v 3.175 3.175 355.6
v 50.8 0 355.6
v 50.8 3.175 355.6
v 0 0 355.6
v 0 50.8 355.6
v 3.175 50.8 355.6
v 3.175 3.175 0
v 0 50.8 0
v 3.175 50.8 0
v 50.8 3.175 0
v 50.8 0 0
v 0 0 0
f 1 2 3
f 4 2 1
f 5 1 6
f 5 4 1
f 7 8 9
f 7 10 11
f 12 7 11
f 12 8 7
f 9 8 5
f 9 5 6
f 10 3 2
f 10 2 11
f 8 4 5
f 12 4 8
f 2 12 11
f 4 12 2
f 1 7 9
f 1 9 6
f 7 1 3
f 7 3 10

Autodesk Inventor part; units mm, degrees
ref_plane "YZ Plane" through (0, 0, 0) normal (1, 0, 0) x (0, 1, 0)
ref_plane "XZ Plane" through (0, 0, 0) normal (0, 1, 0) x (-1, 0, 0)
ref_plane "XY Plane" through (0, 0, 0) normal (0, 0, 1) x (1, 0, 0)
sketch "Sketch1" plane through (0, 0, 0) normal (0, 0, 1) x (1, 0, 0)
  line L0 (0, 0) -> (38.1, 0)
  line L1 (38.1, 0) -> (38.1, 3.175)
  line L2 (38.1, 3.175) -> (0, 3.175)
  line L3 (0, 3.175) -> (0, 0)
  dimension "d0" = 38.1
  dimension "d1" = 3.175
extrude "Extrusion1" add sketch "Sketch1" along normal blind 355.6
sketch "Sketch2" plane through (0, 0, 355.6) normal (0, 0, 1) x (1, 0, 0)
  line L0 (0, 0) -> (3.175, 0)
  line L1 (3.175, 0) -> (3.175, 38.1)
  line L2 (3.175, 38.1) -> (0, 38.1)
  line L3 (0, 38.1) -> (0, 0)
  dimension "d4" = 3.175
  dimension "d5" = 38.1
extrude "Extrusion2" add sketch "Sketch2" against normal blind 355.6
sketch "Sketch3" plane through (3.175, 38.1, 355.6) normal (0, 1, 0) x (1, 0, 0)
  line L0 (-3.175, 355.6) -> (0, 355.6)
  line L1 (0, 355.6) -> (0, 0)
  line L2 (0, 0) -> (-3.175, 0)
  line L3 (-3.175, 0) -> (-3.175, 355.6)
extrude "Extrusion3" add sketch "Sketch3" along normal blind 12.7
sketch "Sketch4" plane through (38.1, 3.175, 355.6) normal (1, 0, 0) x (0, 0, -1)
  line L0 (355.6, -3.175) -> (0, -3.175)
  line L1 (0, -3.175) -> (0, 0)
  line L2 (0, 0) -> (355.6, 0)
  line L3 (355.6, 0) -> (355.6, -3.175)
extrude "Extrusion4" add sketch "Sketch4" along normal blind 12.7
properties part number "14in 2inL Channel"
